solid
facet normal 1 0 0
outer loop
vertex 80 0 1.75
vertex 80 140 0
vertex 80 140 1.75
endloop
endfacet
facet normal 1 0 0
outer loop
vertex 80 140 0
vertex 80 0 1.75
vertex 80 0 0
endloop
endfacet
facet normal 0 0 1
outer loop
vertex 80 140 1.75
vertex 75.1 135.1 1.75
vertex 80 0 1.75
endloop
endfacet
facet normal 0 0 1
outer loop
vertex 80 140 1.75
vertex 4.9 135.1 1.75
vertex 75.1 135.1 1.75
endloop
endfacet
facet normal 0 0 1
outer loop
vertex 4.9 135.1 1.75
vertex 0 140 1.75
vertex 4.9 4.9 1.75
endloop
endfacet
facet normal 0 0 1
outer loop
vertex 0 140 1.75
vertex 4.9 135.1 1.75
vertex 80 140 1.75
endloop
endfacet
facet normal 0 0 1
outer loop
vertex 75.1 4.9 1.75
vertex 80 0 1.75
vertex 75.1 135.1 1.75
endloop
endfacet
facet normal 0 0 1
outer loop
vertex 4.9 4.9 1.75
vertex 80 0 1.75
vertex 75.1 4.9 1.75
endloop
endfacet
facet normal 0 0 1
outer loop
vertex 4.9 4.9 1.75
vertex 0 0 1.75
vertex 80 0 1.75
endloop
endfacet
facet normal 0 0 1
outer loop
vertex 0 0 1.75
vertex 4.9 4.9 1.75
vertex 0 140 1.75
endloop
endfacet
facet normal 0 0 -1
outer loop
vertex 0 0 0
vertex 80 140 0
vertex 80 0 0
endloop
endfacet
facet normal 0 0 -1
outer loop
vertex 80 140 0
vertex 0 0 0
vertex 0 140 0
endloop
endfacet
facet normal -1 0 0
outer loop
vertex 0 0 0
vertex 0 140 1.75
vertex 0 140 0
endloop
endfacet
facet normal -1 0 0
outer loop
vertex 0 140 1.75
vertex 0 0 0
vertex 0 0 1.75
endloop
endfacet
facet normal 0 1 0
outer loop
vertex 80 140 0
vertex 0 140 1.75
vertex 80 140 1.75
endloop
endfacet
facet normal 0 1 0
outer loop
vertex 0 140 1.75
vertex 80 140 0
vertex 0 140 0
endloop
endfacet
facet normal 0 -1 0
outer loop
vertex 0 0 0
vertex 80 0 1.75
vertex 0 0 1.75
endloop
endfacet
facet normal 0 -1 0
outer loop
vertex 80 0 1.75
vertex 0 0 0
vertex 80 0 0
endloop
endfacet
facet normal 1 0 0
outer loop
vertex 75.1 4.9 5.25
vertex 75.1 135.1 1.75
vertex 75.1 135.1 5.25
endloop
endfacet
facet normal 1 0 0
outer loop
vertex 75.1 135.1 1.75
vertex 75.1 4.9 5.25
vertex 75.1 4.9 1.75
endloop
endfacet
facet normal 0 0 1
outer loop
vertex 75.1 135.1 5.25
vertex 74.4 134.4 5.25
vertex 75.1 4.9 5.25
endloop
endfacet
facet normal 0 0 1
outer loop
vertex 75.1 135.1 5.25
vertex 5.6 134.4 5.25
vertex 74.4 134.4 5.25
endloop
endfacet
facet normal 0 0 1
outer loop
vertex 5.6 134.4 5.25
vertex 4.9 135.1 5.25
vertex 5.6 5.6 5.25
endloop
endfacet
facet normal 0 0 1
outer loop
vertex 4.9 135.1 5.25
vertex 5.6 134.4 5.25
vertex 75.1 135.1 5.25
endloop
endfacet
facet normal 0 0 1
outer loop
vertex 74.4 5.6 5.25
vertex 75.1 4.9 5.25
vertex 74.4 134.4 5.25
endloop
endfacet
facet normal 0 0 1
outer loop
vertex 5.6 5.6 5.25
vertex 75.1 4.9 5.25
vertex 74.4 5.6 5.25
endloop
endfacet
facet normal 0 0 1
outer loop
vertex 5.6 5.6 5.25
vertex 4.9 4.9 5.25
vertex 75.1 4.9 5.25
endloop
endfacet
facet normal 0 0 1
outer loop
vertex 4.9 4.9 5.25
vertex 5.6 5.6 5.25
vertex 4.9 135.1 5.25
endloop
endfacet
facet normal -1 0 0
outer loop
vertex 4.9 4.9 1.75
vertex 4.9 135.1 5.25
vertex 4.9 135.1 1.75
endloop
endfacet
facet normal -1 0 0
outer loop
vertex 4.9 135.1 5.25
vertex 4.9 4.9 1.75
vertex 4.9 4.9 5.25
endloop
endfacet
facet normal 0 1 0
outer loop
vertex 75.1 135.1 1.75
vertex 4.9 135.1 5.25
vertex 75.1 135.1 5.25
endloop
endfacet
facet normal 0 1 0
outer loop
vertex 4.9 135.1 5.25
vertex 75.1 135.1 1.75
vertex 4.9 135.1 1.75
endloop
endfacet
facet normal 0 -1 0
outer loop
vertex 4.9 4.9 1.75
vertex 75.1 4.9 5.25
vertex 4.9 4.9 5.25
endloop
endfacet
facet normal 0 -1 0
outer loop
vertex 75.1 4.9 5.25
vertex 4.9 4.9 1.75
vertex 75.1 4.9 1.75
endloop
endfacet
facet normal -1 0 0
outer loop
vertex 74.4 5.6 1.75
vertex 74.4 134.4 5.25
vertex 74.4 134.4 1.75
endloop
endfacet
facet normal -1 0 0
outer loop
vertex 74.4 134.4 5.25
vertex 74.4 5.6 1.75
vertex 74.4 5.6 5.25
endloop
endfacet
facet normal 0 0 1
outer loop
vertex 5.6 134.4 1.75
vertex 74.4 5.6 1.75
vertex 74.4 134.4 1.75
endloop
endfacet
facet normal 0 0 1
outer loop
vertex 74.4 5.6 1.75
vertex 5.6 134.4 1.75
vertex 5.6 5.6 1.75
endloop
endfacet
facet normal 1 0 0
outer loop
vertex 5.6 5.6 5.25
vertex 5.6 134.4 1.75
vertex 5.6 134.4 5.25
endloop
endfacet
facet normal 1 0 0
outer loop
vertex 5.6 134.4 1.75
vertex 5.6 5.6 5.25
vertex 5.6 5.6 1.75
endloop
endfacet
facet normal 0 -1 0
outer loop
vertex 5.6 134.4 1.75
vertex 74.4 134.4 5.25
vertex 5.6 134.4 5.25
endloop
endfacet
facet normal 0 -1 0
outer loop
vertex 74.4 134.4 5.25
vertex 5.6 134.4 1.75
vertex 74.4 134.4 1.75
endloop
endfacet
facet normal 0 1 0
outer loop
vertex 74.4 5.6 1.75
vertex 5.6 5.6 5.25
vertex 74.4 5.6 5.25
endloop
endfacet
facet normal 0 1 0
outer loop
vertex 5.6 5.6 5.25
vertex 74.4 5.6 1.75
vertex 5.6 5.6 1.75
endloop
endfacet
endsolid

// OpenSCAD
//everything is in units of millimeters
resolution = 0.35;

//variables to keep in-sync with the other scad file
mainDepth = 80;
mainWidth = 140;
mainHeight = 42;
mainShellThickness = 4.9;

lidThickness = resolution * 5; //z-axis
lidWidth = resolution * 2; //x & y axis thickness of the wall

difference() {
  union() {
    //top cover of the lid
    cube([mainDepth, mainWidth, lidThickness]);
    
    //the inner lip
    translate([mainShellThickness, mainShellThickness, 0]) {
      cube([mainDepth - mainShellThickness*2, mainWidth - mainShellThickness*2, lidThickness*3]);
    };
  };
  
  //cutting out the inside to save on plastic used
  translate([mainShellThickness + lidWidth, mainShellThickness + lidWidth, lidThickness]) {
    cube([mainDepth - mainShellThickness*2 - lidWidth*2, mainWidth - mainShellThickness*2 - lidWidth*2, lidThickness*2]);
  }
};
